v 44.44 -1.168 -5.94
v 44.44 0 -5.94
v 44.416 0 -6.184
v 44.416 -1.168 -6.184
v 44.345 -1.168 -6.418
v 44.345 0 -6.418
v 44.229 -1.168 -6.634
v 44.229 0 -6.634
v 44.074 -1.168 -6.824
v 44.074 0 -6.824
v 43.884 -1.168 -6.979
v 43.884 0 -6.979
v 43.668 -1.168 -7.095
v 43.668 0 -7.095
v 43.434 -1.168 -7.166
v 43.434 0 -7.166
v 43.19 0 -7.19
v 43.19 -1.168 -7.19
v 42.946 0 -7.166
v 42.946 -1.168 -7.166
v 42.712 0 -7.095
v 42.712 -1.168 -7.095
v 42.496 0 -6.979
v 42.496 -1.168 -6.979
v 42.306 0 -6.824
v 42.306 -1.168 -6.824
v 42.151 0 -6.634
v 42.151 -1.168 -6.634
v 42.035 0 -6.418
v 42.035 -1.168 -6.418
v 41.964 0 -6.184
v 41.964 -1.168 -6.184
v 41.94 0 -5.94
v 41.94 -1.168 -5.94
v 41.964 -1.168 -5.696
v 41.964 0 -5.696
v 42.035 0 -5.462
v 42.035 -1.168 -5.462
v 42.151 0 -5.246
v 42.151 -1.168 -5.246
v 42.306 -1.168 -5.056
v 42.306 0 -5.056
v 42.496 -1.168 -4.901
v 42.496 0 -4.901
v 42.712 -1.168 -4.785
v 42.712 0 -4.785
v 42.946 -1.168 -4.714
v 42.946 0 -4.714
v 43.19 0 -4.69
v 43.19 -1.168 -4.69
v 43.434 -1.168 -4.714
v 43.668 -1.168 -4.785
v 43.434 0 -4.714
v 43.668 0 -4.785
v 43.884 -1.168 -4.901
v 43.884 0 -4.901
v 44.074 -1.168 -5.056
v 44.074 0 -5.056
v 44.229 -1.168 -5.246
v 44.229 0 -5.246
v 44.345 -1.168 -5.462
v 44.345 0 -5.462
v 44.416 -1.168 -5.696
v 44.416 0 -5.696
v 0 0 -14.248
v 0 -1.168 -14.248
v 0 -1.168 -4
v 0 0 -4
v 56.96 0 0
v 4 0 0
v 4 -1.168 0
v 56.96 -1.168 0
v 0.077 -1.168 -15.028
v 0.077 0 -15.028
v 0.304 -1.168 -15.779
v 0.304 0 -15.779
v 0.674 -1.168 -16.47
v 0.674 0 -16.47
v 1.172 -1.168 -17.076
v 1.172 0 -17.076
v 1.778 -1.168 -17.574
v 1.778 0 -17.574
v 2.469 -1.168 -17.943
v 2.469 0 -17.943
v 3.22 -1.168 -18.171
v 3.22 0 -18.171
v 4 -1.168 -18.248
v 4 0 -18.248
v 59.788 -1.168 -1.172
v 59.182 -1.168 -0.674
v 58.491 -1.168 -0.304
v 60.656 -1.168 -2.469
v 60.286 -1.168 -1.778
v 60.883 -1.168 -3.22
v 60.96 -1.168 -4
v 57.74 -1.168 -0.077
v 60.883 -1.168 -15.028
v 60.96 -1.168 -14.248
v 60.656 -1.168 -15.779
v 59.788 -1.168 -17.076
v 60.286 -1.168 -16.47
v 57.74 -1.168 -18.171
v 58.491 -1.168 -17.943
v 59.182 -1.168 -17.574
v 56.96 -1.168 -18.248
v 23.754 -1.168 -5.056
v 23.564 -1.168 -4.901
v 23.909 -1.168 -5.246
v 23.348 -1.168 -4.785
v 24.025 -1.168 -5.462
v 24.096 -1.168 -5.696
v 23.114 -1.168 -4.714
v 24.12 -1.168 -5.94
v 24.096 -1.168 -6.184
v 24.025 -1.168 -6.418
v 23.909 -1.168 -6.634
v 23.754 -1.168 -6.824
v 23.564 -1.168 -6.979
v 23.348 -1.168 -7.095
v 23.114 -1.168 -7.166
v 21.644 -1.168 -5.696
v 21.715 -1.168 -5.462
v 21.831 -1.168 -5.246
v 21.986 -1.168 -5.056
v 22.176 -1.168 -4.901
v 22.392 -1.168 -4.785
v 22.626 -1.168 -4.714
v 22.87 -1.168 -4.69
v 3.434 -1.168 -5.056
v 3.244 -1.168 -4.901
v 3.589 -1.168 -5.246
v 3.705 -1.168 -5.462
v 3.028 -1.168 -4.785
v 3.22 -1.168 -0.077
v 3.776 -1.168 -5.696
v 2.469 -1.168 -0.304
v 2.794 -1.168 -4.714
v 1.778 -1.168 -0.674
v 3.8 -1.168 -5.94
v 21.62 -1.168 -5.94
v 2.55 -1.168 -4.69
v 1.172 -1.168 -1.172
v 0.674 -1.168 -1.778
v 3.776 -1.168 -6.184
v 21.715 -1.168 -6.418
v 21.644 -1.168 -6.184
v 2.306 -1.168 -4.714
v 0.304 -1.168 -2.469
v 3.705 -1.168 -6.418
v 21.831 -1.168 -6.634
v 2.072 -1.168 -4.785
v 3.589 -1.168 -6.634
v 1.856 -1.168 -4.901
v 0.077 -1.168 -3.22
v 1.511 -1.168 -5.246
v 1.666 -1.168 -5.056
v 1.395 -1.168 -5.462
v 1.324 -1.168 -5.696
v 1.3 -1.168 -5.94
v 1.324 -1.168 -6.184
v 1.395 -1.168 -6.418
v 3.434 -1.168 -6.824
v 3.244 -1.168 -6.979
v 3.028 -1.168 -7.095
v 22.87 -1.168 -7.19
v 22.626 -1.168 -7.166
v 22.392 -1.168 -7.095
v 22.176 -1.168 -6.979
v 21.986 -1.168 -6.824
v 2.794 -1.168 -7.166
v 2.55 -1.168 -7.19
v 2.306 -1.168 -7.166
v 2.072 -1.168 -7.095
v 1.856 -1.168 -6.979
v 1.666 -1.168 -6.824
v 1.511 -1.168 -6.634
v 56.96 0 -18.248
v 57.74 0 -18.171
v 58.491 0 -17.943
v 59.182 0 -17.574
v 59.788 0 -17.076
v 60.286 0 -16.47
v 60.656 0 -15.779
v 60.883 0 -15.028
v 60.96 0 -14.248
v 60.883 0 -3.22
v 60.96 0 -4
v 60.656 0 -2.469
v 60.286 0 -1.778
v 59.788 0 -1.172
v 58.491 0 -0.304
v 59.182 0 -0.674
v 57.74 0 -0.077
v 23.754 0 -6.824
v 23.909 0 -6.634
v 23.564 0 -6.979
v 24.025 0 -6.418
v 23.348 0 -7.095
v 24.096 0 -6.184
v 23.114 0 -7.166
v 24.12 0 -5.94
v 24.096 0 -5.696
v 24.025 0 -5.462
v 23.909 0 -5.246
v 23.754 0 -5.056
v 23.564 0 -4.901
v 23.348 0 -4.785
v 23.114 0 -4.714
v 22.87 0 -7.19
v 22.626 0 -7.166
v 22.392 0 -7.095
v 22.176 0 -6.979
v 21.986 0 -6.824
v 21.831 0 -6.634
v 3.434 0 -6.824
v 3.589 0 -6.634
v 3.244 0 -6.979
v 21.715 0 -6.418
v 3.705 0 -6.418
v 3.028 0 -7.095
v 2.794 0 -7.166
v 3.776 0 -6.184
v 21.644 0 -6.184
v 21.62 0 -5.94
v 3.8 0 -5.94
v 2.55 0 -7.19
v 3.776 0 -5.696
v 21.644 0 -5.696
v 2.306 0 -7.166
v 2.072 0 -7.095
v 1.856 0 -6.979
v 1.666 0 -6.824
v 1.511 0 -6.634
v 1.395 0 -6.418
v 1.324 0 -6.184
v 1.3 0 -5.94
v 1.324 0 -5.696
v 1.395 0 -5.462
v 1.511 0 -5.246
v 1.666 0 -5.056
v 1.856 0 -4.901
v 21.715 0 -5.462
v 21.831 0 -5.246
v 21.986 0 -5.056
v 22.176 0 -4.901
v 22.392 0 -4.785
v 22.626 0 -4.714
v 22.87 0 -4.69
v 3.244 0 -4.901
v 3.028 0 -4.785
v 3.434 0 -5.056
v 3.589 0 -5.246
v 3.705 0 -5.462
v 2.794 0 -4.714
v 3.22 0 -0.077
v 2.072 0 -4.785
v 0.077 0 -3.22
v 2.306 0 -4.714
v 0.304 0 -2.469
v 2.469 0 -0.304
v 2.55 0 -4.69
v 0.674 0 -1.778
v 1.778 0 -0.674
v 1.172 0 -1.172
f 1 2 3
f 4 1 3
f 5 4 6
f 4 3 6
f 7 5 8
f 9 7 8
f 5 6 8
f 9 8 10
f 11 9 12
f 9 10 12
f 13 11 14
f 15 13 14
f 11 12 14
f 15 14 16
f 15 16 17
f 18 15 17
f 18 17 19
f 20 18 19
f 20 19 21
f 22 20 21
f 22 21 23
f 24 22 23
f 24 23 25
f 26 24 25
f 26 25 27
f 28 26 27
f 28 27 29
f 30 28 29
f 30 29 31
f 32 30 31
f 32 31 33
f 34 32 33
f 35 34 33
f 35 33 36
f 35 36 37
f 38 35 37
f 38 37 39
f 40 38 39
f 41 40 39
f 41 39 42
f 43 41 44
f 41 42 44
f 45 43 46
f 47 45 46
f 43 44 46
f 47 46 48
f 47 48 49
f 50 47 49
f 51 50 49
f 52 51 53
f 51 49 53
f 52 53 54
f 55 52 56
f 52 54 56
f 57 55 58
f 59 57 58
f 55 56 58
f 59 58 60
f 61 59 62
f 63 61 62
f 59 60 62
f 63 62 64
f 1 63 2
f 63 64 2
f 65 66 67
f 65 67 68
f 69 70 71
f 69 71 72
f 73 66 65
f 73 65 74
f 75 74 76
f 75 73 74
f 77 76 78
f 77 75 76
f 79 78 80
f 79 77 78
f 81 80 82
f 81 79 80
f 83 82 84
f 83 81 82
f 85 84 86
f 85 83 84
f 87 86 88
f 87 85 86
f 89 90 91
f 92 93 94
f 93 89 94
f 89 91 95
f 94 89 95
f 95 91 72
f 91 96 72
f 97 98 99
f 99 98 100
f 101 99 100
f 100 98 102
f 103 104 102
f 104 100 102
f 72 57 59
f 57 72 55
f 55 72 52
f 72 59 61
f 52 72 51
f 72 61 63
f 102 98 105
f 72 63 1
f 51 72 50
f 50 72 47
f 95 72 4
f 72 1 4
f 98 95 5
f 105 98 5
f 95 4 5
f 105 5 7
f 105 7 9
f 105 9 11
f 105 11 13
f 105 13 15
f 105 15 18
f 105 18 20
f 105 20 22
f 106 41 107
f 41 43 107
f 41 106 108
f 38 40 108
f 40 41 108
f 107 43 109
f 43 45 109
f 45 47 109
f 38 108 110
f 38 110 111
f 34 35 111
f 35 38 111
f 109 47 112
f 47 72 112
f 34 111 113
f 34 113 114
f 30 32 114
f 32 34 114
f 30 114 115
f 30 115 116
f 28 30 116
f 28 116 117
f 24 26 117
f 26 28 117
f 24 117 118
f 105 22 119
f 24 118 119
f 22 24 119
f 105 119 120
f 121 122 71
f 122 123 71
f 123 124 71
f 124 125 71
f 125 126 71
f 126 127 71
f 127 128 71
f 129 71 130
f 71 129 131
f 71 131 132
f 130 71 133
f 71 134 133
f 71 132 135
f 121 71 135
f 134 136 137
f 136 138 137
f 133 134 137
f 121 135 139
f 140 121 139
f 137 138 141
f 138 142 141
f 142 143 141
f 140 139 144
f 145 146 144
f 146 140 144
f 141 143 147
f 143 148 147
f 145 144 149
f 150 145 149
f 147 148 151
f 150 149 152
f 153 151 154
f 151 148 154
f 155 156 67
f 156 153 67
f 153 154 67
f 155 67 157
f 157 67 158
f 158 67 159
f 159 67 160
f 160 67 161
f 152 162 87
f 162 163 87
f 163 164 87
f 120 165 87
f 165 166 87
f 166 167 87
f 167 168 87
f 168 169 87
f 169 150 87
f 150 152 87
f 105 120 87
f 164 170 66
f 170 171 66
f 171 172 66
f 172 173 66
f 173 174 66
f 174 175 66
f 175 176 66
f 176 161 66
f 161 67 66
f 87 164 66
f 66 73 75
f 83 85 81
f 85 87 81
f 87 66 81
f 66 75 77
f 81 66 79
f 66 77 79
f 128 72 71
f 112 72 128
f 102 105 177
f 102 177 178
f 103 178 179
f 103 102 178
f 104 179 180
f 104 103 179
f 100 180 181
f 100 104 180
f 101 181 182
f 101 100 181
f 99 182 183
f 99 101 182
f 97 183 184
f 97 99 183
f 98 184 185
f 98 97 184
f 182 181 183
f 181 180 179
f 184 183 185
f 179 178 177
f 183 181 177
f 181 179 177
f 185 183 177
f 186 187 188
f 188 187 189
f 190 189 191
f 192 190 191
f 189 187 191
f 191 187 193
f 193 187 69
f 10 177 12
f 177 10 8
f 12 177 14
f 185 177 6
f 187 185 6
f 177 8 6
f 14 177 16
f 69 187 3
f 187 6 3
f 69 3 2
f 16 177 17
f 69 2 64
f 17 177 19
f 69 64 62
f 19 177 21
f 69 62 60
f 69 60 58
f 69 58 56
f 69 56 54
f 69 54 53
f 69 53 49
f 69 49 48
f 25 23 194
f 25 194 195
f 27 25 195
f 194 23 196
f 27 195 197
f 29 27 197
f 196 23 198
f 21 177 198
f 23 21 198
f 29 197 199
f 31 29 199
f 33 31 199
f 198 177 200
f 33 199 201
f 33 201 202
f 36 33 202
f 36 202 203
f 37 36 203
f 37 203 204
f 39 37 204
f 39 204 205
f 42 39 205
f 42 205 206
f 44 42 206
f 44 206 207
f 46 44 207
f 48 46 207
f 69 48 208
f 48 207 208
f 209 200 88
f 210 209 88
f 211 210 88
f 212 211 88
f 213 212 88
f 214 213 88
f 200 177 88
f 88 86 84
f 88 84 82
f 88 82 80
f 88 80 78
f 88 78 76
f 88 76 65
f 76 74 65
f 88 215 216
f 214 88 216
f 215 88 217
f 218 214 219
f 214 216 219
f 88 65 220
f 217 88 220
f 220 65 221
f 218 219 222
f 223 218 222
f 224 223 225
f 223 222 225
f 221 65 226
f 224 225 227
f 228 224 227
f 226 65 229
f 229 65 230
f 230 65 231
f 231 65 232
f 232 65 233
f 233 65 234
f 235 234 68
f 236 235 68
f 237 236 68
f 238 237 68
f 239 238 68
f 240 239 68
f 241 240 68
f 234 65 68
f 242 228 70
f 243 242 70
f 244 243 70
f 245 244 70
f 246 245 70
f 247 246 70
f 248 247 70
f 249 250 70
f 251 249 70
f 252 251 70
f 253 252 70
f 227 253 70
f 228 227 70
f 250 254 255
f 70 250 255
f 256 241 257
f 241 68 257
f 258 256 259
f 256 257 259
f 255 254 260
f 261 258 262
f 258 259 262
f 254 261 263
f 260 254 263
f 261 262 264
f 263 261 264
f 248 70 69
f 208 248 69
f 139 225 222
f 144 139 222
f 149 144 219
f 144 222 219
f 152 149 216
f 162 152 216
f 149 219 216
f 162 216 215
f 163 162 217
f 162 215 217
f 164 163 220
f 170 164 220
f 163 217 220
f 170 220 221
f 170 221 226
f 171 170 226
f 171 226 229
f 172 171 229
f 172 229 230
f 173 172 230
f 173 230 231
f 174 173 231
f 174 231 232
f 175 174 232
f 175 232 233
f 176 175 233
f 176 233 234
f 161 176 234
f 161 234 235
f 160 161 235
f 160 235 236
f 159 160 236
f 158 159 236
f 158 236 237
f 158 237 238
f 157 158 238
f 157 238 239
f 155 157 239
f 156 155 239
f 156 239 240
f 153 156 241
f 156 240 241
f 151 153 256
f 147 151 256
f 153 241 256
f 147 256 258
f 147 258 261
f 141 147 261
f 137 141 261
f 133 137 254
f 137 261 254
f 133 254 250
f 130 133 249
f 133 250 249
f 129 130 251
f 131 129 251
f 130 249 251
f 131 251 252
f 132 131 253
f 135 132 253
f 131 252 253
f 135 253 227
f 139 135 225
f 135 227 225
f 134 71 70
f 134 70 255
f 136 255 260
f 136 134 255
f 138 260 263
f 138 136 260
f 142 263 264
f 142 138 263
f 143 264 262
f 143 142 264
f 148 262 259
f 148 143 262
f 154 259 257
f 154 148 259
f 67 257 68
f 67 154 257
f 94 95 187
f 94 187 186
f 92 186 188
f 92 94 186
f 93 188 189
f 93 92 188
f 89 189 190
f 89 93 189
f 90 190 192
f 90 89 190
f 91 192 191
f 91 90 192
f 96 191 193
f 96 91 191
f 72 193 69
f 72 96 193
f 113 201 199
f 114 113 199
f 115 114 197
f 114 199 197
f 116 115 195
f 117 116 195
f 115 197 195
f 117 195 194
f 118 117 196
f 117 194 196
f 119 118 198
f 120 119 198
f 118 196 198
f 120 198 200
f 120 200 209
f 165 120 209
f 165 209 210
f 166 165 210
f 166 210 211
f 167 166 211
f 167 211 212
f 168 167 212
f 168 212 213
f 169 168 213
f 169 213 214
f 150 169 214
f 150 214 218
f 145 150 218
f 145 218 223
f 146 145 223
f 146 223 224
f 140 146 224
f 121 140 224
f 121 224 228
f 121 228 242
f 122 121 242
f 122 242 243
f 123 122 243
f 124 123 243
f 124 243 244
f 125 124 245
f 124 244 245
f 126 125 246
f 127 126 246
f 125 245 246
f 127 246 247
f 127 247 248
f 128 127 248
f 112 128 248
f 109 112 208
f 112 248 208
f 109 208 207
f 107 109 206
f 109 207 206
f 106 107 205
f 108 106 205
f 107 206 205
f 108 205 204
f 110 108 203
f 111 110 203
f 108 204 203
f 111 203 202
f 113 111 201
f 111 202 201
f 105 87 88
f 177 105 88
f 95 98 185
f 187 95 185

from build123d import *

# Parameters (mm, degrees)
SKETCH1_W                    = 60.96
SKETCH1_H                    = 10
BASE_FLANGE1_DEPTH           = 1.1684
EDGE_FLANGE1_STRIP_W         = 7.0104
EDGE_FLANGE1_STRIP_H         = 1.1684
EDGE_FLANGE1_STRIP_CUT_DEPTH = 60.96
EDGE_FLANGE1_DEPTH           = 60.96
TAP_DRILL_FOR_M3X0_5_TAP1_D  = 2.5
FILLET1_DEPTH                = 60.96
FILLET1_2_DEPTH              = 60.96
FILLET1_START                = -2
FILLET1_3_DEPTH              = 3


with BuildPart() as part:
    # Base-Flange1: sheet metal written as solids
    # Sketch1 → Base-Flange1 (new body)
    with BuildSketch(Plane(origin=(0, 0, 0), x_dir=(1, 0, 0), z_dir=(0, 1, 0))):
        with Locations((30.48, 5)):
            Rectangle(SKETCH1_W, SKETCH1_H)
    extrude(amount=-BASE_FLANGE1_DEPTH)

    # Edge-Flange1: sheet metal written as solids
    # Edge-Flange1 strip (on a plane across the edge) → Edge-Flange1 strip cut (cut)
    with BuildSketch(Plane(origin=(0, -1.1684, -10), x_dir=(0, 0, 1), z_dir=(1, 0, 0))):
        with Locations((-1.1684, -0.5842)):
            Rectangle(EDGE_FLANGE1_STRIP_W, EDGE_FLANGE1_STRIP_H)
    extrude(amount=EDGE_FLANGE1_STRIP_CUT_DEPTH, mode=Mode.SUBTRACT)

    # Edge-Flange1 section (on a plane across the edge) → Edge-Flange1 (add)
    with BuildSketch(Plane(origin=(0, -1.1684, -10), x_dir=(0, 0, 1), z_dir=(1, 0, 0))):
        with BuildLine():
            Line((0, 1.1684), (0, 9))
            Line((0, 9), (1.1684, 9))
            Line((1.1684, 9), (1.1684, 1.1684))
            ThreePointArc((1.1684, 1.1684), (1.510616437, 0.342216437), (2.3368, 0))
            Line((2.3368, 0), (2.3368, -1.1684))
            ThreePointArc((2.3368, -1.1684), (0.684432874, -0.483967126), (0, 1.1684))
        make_face()
    extrude(amount=EDGE_FLANGE1_DEPTH)

    # Tap Drill for M3x0.5 Tap1 (through all)
    with Locations(Plane(origin=(0, -1.1684, 0), x_dir=(-1, 0, 0), z_dir=(0, -1, 0))):
        with Locations((-2.55, 5.94), (-22.87, 5.94), (-43.19, 5.94)):
            Hole(TAP_DRILL_FOR_M3X0_5_TAP1_D / 2)

    # Fillet1: read off the stored shape, not the designer's step
    # Fillet1 outline → Fillet1 (cut)
    with BuildSketch(Plane.YZ):
        with BuildLine():
            ThreePointArc((-2.3368, -10), (-1.731991655, -9.920375471), (-1.1684, -9.686928163))
            Line((-1.1684, -9.686928163), (-1.1684, -7.6632))
            ThreePointArc((-1.1684, -7.6632), (-1.510616437, -8.489383563), (-2.3368, -8.8316))
            Line((-2.3368, -8.8316), (-10.1684, -8.8316))
            Line((-10.1684, -8.8316), (-10.1684, -10))
            Line((-10.1684, -10), (-2.3368, -10))
        make_face()
    extrude(amount=FILLET1_DEPTH, mode=Mode.SUBTRACT)

    # Fillet1 2 outline → Fillet1 2 (add)
    with BuildSketch(Plane.YZ):
        with BuildLine():
            Line((0, -18.247777642), (0, -7.6632))
            ThreePointArc((0, -7.6632), (-0.313071837, -8.8316), (-1.1684, -9.686928163))
            Line((-1.1684, -9.686928163), (-1.1684, -18.247777642))
            Line((-1.1684, -18.247777642), (0, -18.247777642))
        make_face()
    extrude(amount=FILLET1_2_DEPTH)

    # Fillet1 3 outline → Fillet1 3 (cut)
    with BuildSketch(Plane(origin=(0, 0, 0), x_dir=(1, 0, 0), z_dir=(0, 1, 0)).offset(FILLET1_START)):
        with BuildLine():
            Line((60.96, 18.247777642), (56.96, 18.247777642))
            ThreePointArc((56.96, 18.247777642), (59.788427125, 17.076204767), (60.96, 14.247777642))
            Line((60.96, 14.247777642), (60.96, 18.247777642))
        make_face()
        with BuildLine():
            ThreePointArc((0, 14.247777642), (1.171572875, 17.076204767), (4, 18.247777642))
            Line((4, 18.247777642), (0, 18.247777642))
            Line((0, 18.247777642), (0, 14.247777642))
        make_face()
        with BuildLine():
            Line((60.96, 0), (60.96, 4))
            ThreePointArc((60.96, 4), (59.788427125, 1.171572875), (56.96, 0))
            Line((56.96, 0), (60.96, 0))
        make_face()
        with BuildLine():
            ThreePointArc((4, 0), (1.171572875, 1.171572875), (0, 4))
            Line((0, 4), (0, 0))
            Line((0, 0), (4, 0))
        make_face()
    extrude(amount=FILLET1_3_DEPTH, mode=Mode.SUBTRACT)


solid = part.part
